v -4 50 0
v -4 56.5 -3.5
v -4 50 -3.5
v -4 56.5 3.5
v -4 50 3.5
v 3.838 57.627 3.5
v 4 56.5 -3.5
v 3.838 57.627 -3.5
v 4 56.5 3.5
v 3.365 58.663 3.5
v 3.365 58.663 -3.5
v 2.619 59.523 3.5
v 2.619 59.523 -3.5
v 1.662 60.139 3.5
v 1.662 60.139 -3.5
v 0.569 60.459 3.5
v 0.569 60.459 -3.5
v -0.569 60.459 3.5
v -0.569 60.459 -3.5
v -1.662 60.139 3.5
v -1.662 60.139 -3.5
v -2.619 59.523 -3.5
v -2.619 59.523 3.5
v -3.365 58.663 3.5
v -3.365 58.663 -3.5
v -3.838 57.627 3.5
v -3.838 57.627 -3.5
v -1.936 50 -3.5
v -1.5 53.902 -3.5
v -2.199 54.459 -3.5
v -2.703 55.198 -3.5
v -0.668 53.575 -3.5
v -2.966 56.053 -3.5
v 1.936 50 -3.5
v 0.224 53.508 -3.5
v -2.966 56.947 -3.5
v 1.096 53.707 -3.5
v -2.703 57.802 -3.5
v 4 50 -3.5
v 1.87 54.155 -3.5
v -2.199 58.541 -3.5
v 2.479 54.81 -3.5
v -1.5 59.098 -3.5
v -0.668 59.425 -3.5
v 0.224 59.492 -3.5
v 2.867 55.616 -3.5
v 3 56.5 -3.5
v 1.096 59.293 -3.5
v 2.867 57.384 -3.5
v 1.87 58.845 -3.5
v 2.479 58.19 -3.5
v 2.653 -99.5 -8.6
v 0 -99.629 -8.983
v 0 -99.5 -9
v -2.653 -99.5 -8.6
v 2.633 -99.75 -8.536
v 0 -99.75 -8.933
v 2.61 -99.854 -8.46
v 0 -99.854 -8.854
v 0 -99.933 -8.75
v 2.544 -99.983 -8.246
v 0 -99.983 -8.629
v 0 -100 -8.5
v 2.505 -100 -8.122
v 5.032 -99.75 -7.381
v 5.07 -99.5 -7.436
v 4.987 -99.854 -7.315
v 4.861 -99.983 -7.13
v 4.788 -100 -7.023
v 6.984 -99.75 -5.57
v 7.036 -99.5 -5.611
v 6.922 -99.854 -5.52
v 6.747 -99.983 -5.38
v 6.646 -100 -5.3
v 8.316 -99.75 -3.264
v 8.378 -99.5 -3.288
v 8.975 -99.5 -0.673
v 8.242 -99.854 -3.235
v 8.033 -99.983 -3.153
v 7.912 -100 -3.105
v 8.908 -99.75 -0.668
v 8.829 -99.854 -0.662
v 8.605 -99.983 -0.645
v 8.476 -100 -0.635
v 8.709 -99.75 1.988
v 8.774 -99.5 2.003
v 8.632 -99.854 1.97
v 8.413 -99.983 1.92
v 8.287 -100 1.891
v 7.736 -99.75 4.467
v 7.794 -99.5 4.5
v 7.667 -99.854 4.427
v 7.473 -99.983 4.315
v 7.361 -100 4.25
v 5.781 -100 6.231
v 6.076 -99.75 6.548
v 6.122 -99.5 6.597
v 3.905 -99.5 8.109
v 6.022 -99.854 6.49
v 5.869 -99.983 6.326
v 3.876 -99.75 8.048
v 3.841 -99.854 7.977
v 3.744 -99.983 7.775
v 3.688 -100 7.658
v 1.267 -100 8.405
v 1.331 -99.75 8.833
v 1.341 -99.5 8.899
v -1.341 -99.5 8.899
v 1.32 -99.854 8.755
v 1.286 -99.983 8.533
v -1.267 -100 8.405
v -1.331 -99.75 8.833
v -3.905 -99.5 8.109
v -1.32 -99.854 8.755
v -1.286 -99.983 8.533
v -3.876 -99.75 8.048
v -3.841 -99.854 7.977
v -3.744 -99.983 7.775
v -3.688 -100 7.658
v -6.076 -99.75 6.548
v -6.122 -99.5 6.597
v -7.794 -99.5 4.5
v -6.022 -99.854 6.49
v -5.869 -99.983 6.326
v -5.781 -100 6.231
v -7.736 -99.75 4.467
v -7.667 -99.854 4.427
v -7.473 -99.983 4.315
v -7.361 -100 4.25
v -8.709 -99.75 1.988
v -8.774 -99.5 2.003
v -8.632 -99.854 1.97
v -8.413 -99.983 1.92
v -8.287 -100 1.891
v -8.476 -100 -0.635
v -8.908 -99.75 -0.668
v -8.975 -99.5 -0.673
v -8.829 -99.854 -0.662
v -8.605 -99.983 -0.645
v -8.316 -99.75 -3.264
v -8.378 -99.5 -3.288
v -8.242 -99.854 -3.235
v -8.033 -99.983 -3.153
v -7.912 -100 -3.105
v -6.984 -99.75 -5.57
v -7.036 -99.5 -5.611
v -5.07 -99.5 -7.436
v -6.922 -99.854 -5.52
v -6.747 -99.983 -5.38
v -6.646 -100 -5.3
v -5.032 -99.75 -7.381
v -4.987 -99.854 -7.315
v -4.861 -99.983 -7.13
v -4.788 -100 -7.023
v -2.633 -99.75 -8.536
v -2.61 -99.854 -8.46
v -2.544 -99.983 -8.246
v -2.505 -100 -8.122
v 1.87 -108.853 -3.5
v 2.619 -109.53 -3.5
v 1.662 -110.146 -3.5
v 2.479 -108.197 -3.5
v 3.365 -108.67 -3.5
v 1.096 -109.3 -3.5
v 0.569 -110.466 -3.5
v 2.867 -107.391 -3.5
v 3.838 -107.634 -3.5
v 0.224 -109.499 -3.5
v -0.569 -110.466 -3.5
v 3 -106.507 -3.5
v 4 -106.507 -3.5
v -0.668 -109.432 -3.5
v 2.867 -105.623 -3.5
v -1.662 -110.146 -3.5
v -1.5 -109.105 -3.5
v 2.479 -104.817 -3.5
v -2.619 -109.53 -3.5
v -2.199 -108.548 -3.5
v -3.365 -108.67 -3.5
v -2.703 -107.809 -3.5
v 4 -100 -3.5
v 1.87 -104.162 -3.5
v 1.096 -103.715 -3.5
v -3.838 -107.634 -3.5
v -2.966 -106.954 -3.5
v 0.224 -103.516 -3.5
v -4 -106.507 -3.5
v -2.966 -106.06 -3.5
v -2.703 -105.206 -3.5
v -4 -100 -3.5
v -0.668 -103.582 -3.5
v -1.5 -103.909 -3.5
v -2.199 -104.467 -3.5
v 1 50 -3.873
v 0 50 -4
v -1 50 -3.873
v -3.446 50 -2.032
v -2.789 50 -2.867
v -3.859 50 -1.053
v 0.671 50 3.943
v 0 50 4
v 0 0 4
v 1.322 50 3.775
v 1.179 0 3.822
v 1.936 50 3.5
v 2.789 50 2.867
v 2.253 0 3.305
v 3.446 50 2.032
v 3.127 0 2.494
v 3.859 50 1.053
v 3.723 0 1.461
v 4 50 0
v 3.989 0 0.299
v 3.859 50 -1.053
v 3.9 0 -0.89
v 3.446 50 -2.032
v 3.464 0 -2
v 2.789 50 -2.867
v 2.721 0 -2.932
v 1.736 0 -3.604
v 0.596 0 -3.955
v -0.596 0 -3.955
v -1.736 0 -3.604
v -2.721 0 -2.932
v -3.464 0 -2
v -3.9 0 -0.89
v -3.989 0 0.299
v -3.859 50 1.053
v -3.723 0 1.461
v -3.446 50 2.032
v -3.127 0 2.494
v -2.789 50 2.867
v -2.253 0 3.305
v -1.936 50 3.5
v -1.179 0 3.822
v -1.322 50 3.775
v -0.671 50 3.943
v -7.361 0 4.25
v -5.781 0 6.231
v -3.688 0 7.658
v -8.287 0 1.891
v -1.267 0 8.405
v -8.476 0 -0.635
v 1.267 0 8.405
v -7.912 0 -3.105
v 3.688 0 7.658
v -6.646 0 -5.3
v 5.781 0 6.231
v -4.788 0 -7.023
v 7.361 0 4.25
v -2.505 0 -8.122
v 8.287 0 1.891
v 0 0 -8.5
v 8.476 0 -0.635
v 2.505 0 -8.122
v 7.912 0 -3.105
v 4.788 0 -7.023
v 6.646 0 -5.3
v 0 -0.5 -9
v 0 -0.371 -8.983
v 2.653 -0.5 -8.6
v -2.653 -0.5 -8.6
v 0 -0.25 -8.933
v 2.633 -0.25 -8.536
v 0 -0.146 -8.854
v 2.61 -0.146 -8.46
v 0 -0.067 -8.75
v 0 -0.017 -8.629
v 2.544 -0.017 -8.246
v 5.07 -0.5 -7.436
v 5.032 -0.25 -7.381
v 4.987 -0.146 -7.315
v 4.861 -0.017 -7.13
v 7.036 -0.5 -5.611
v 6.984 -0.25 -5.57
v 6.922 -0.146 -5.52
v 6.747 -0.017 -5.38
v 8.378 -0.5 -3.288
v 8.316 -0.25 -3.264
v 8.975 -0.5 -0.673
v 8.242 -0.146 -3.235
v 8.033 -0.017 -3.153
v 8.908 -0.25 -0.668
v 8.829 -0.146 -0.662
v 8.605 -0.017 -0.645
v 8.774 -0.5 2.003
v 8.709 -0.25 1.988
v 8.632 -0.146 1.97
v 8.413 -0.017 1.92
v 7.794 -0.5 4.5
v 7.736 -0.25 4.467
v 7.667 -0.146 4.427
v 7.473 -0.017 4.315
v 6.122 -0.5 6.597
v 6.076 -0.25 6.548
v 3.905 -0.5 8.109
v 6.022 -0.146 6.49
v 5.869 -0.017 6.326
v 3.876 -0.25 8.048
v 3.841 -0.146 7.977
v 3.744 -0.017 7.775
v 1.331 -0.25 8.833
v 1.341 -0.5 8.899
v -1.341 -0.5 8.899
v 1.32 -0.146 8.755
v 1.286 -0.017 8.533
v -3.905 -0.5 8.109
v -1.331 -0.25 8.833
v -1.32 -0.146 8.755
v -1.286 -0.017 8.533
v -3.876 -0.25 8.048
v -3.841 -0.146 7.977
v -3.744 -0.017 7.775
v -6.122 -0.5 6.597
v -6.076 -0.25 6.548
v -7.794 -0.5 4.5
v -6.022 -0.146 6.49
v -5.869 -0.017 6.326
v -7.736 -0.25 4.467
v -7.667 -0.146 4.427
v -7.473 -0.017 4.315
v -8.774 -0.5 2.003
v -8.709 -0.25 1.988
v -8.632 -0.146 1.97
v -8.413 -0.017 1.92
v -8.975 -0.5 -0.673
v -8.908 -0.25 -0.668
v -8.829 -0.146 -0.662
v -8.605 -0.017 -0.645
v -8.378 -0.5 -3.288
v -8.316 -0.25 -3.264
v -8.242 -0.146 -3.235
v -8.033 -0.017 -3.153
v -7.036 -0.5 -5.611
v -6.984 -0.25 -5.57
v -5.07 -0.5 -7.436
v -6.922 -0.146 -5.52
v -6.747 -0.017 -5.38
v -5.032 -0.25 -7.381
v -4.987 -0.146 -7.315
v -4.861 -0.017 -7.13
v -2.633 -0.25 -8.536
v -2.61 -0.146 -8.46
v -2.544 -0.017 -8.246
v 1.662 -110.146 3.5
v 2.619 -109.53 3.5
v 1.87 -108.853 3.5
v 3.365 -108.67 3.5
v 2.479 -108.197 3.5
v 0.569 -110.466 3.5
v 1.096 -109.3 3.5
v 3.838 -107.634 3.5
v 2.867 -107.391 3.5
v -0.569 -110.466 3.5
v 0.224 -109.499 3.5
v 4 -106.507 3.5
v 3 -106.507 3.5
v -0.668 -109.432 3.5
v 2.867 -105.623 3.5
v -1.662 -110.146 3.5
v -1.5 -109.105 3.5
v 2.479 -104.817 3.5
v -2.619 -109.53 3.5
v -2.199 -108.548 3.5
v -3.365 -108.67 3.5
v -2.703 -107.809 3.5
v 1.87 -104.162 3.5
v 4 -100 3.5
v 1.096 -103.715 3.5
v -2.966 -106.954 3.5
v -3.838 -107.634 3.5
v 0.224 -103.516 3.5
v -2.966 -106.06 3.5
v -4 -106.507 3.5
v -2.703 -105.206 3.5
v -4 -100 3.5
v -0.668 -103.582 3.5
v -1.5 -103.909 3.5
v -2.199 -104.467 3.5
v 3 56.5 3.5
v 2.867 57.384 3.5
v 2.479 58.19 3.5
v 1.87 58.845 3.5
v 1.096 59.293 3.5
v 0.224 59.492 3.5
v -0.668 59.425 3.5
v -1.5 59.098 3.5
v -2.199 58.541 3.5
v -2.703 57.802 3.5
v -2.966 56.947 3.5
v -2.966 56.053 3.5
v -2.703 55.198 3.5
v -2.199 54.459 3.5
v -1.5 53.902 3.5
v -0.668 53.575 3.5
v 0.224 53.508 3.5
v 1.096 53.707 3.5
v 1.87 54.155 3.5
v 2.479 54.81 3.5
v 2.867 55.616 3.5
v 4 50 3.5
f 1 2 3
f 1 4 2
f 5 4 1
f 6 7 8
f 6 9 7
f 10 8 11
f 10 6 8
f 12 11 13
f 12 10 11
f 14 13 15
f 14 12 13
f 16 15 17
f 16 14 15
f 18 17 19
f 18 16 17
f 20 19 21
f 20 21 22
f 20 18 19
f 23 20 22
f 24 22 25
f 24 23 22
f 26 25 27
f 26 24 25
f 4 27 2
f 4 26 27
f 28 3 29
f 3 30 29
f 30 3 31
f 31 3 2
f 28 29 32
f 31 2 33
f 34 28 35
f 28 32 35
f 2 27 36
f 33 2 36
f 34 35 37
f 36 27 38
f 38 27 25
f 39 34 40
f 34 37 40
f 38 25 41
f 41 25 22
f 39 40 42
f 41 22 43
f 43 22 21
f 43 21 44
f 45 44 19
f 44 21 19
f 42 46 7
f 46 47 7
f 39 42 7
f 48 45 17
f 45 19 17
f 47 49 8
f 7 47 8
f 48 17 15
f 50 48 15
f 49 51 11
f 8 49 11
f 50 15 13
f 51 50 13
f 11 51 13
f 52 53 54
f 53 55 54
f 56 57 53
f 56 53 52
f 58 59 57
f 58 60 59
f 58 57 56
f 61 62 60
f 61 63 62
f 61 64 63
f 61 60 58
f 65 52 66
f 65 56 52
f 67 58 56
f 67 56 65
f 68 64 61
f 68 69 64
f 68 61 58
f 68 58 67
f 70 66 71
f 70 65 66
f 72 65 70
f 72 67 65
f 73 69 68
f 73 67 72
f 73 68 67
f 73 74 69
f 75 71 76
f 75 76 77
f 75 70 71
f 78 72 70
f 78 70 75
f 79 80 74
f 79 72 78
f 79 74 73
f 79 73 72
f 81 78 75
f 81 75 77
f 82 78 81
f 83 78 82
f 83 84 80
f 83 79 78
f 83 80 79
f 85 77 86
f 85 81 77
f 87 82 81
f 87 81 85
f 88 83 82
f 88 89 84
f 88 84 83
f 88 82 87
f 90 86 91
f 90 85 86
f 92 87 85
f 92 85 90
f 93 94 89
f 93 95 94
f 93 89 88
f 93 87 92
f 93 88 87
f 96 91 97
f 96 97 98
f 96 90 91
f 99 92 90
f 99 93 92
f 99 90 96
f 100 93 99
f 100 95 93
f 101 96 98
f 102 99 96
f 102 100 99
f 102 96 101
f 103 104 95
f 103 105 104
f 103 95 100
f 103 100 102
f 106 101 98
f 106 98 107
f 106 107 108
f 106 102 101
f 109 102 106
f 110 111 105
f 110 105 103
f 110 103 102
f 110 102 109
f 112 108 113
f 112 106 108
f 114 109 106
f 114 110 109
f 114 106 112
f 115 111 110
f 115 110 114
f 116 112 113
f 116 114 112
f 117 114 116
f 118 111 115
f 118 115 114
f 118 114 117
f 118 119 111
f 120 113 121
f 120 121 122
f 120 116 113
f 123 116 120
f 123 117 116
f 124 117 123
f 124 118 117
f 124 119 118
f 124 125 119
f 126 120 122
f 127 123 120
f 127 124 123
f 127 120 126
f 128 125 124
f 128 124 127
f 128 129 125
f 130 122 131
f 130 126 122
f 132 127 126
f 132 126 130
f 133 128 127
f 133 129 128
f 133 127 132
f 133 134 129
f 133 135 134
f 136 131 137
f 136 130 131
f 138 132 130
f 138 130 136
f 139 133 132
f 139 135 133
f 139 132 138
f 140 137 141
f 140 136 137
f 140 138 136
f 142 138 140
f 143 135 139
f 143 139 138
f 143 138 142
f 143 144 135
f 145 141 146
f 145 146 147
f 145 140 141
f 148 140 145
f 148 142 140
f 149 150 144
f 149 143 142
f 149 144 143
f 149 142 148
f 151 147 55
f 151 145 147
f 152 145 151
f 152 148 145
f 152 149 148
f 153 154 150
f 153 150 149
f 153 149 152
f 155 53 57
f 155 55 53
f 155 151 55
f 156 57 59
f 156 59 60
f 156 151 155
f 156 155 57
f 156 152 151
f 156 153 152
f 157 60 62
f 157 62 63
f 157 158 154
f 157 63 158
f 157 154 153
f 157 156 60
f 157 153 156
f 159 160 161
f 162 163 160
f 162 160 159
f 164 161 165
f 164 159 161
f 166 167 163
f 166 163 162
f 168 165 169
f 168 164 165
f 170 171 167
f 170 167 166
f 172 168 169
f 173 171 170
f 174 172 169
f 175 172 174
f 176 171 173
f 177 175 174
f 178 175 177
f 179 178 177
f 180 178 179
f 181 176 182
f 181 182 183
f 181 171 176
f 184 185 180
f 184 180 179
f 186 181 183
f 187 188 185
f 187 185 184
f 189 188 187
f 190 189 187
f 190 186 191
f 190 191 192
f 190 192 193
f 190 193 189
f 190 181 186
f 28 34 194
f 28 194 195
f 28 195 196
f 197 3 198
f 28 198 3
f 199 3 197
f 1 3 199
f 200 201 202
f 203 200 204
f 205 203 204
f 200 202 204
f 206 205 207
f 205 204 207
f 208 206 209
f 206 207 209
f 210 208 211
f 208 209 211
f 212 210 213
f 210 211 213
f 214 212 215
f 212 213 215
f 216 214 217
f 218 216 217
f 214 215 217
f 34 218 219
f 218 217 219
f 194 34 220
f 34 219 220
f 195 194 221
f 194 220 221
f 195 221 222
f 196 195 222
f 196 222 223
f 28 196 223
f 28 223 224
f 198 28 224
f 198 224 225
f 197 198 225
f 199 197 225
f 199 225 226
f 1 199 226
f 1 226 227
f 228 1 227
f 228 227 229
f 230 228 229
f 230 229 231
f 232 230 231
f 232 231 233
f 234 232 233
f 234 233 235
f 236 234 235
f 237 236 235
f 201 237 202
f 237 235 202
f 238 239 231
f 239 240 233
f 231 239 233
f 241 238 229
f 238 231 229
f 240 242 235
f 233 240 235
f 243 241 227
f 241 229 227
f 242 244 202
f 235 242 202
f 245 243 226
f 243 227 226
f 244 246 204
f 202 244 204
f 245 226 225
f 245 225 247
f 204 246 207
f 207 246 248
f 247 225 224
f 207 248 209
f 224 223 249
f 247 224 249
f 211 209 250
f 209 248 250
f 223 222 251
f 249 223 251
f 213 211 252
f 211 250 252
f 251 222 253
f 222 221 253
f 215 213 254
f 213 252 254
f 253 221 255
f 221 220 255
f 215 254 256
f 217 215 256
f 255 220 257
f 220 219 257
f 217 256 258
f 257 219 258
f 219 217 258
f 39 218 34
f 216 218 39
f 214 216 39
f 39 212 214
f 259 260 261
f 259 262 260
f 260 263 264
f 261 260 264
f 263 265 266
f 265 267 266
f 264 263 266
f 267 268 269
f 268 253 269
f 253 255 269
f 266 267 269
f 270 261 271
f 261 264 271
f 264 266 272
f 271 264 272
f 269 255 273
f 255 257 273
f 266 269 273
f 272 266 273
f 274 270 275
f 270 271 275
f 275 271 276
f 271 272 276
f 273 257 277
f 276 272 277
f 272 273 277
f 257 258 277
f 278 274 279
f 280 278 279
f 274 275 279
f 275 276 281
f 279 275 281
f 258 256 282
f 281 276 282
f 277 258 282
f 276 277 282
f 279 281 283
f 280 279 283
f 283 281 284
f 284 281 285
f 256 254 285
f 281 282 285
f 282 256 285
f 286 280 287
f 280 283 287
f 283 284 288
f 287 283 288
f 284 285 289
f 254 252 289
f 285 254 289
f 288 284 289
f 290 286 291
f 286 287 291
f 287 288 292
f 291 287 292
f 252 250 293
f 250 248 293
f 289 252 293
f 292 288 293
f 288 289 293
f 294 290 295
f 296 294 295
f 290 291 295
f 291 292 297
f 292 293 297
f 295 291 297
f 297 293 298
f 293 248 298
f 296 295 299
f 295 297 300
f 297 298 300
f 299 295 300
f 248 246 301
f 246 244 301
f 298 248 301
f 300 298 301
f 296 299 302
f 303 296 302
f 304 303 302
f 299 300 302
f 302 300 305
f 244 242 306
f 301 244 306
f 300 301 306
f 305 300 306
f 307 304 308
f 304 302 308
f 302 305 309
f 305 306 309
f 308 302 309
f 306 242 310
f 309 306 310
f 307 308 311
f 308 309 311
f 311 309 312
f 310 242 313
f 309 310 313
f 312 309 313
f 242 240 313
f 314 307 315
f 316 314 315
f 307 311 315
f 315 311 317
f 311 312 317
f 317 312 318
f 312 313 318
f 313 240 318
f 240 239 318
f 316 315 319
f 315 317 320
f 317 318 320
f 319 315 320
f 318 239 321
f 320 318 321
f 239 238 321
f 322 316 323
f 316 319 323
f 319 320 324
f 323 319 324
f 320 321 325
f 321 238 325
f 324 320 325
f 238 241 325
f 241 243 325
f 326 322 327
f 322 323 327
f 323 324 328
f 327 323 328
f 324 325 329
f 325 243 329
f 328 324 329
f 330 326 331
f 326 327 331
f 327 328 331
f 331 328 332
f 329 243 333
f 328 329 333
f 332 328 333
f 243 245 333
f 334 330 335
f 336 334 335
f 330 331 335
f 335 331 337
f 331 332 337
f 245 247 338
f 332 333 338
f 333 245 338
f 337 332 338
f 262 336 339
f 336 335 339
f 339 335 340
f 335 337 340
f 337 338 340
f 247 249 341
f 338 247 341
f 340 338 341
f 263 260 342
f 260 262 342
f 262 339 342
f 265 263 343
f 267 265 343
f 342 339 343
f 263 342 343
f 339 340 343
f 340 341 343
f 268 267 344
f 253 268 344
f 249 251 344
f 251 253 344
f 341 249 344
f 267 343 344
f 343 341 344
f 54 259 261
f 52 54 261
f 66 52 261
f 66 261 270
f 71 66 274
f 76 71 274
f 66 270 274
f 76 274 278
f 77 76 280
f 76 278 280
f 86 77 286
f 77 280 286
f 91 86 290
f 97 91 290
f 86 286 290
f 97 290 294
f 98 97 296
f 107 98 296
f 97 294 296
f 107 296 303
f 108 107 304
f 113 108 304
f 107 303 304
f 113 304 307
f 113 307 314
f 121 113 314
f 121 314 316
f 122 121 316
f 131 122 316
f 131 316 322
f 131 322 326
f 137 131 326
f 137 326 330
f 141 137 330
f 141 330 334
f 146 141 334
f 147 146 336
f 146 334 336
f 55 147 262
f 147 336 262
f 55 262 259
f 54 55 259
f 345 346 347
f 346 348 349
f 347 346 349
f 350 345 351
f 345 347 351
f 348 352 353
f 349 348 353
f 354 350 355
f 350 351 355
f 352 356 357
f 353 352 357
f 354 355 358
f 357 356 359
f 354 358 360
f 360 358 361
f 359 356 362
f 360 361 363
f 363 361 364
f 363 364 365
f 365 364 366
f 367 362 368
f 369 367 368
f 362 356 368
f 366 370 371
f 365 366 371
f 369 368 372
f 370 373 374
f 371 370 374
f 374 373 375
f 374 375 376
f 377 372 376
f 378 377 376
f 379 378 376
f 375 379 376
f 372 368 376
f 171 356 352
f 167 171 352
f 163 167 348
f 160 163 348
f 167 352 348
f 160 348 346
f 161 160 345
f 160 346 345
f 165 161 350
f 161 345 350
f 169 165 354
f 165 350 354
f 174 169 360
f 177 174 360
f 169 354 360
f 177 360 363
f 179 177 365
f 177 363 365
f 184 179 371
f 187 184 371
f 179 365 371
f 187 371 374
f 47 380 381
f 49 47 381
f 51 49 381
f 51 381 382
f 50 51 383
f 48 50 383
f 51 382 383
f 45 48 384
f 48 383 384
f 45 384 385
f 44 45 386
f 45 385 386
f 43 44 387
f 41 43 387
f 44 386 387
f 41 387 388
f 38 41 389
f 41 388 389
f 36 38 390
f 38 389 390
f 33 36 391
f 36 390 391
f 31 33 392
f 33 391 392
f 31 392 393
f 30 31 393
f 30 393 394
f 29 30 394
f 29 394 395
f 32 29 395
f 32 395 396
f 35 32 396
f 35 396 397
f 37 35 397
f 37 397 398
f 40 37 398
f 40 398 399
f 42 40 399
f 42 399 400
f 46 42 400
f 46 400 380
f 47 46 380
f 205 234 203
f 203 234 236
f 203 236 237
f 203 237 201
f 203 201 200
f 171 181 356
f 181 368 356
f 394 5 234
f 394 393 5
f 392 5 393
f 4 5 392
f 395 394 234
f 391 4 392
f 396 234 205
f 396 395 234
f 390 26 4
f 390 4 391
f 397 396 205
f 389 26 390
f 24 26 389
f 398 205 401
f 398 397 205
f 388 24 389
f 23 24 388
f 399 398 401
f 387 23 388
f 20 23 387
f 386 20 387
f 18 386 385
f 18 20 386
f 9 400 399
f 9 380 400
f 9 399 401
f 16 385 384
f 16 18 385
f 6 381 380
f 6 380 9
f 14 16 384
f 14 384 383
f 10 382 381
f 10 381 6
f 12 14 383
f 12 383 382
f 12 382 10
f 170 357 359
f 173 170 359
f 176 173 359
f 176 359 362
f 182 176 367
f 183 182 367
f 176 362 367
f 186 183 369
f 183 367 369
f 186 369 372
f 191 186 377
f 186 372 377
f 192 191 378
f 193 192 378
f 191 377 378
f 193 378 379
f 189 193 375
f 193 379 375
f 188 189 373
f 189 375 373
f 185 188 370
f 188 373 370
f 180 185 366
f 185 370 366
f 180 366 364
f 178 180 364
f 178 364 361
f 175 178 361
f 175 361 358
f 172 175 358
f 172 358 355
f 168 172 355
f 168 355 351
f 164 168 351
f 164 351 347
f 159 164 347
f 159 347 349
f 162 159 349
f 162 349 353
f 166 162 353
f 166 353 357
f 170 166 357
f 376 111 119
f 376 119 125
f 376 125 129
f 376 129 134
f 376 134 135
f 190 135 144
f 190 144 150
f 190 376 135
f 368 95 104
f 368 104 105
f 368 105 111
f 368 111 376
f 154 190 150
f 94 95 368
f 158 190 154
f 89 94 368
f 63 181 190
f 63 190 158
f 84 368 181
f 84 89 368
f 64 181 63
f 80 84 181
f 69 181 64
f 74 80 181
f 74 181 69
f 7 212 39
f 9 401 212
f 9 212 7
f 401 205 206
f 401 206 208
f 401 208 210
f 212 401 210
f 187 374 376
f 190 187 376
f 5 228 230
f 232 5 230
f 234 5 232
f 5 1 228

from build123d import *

# Parameters (mm, degrees)
SKETCH1_R           = 4
BOSS_EXTRUDE1_DEPTH = 50
SKETCH2_R           = 9
BOSS_EXTRUDE2_DEPTH = 100
FILLET1_R           = 0.5
BOSS_EXTRUDE4_DEPTH = 3.5
BOSS_EXTRUDE6_DEPTH = 3.5
SKETCH7_R           = 3
CUT_EXTRUDE1_DEPTH  = 112.575459307
SKETCH9_R           = 3
CUT_EXTRUDE2_DEPTH  = 112.575459307


with BuildPart() as part:
    # Sketch1 → Boss-Extrude1 (new body)
    with BuildSketch(Plane(origin=(0, 0, 0), x_dir=(1, 0, 0), z_dir=(0, 1, 0))):
        with Locations(Location((0, 0, 0), (0, 0, 270))):
            Circle(SKETCH1_R)
    extrude(amount=BOSS_EXTRUDE1_DEPTH)

    # Sketch2 → Boss-Extrude2 (add)
    with BuildSketch(Plane(origin=(0, 0, 0), x_dir=(-1, 0, 0), z_dir=(0, -1, 0))):
        with Locations(Location((0, 0, 0), (0, 0, 90))):
            Circle(SKETCH2_R)
    extrude(amount=BOSS_EXTRUDE2_DEPTH)

    # Fillet1
    fillet1_edges = [part.edges().sort_by_distance(p)[0] for p in [
        (0, 0, 9),
        (0, -100, 9),
    ]]
    fillet(fillet1_edges, radius=FILLET1_R)

    # Sketch4 → Boss-Extrude4 (add, symmetric)
    with BuildSketch(Plane.XY):
        with BuildLine():
            Line((-4, -106.507163193), (-4, -100))
            Line((-4, -100), (4, -100))
            Line((4, -100), (4, -106.507163193))
            ThreePointArc((4, -106.507163193), (0, -110.507163193), (-4, -106.507163193))
        make_face()
    extrude(amount=BOSS_EXTRUDE4_DEPTH, both=True)

    # Sketch5 → Boss-Extrude6 (add, symmetric)
    with BuildSketch(Plane.XY):
        with BuildLine():
            Line((-4, 56.5), (-4, 50))
            Line((-4, 50), (4, 50))
            Line((4, 50), (4, 56.5))
            ThreePointArc((4, 56.5), (0, 60.499999816), (-4, 56.5))
        make_face()
    extrude(amount=BOSS_EXTRUDE6_DEPTH, both=True)

    # Sketch7 → Cut-Extrude1 (cut, through all)
    with BuildSketch(Plane.XY.offset(3.5)):
        with Locations((0, 56.499999816)):
            Circle(SKETCH7_R)
    extrude(amount=-CUT_EXTRUDE1_DEPTH, mode=Mode.SUBTRACT)

    # Sketch9 → Cut-Extrude2 (cut, through all)
    with BuildSketch(Plane.XY.offset(3.5)):
        with Locations((0, -106.507163193)):
            Circle(SKETCH9_R)
    extrude(amount=-CUT_EXTRUDE2_DEPTH, mode=Mode.SUBTRACT)


solid = part.part
